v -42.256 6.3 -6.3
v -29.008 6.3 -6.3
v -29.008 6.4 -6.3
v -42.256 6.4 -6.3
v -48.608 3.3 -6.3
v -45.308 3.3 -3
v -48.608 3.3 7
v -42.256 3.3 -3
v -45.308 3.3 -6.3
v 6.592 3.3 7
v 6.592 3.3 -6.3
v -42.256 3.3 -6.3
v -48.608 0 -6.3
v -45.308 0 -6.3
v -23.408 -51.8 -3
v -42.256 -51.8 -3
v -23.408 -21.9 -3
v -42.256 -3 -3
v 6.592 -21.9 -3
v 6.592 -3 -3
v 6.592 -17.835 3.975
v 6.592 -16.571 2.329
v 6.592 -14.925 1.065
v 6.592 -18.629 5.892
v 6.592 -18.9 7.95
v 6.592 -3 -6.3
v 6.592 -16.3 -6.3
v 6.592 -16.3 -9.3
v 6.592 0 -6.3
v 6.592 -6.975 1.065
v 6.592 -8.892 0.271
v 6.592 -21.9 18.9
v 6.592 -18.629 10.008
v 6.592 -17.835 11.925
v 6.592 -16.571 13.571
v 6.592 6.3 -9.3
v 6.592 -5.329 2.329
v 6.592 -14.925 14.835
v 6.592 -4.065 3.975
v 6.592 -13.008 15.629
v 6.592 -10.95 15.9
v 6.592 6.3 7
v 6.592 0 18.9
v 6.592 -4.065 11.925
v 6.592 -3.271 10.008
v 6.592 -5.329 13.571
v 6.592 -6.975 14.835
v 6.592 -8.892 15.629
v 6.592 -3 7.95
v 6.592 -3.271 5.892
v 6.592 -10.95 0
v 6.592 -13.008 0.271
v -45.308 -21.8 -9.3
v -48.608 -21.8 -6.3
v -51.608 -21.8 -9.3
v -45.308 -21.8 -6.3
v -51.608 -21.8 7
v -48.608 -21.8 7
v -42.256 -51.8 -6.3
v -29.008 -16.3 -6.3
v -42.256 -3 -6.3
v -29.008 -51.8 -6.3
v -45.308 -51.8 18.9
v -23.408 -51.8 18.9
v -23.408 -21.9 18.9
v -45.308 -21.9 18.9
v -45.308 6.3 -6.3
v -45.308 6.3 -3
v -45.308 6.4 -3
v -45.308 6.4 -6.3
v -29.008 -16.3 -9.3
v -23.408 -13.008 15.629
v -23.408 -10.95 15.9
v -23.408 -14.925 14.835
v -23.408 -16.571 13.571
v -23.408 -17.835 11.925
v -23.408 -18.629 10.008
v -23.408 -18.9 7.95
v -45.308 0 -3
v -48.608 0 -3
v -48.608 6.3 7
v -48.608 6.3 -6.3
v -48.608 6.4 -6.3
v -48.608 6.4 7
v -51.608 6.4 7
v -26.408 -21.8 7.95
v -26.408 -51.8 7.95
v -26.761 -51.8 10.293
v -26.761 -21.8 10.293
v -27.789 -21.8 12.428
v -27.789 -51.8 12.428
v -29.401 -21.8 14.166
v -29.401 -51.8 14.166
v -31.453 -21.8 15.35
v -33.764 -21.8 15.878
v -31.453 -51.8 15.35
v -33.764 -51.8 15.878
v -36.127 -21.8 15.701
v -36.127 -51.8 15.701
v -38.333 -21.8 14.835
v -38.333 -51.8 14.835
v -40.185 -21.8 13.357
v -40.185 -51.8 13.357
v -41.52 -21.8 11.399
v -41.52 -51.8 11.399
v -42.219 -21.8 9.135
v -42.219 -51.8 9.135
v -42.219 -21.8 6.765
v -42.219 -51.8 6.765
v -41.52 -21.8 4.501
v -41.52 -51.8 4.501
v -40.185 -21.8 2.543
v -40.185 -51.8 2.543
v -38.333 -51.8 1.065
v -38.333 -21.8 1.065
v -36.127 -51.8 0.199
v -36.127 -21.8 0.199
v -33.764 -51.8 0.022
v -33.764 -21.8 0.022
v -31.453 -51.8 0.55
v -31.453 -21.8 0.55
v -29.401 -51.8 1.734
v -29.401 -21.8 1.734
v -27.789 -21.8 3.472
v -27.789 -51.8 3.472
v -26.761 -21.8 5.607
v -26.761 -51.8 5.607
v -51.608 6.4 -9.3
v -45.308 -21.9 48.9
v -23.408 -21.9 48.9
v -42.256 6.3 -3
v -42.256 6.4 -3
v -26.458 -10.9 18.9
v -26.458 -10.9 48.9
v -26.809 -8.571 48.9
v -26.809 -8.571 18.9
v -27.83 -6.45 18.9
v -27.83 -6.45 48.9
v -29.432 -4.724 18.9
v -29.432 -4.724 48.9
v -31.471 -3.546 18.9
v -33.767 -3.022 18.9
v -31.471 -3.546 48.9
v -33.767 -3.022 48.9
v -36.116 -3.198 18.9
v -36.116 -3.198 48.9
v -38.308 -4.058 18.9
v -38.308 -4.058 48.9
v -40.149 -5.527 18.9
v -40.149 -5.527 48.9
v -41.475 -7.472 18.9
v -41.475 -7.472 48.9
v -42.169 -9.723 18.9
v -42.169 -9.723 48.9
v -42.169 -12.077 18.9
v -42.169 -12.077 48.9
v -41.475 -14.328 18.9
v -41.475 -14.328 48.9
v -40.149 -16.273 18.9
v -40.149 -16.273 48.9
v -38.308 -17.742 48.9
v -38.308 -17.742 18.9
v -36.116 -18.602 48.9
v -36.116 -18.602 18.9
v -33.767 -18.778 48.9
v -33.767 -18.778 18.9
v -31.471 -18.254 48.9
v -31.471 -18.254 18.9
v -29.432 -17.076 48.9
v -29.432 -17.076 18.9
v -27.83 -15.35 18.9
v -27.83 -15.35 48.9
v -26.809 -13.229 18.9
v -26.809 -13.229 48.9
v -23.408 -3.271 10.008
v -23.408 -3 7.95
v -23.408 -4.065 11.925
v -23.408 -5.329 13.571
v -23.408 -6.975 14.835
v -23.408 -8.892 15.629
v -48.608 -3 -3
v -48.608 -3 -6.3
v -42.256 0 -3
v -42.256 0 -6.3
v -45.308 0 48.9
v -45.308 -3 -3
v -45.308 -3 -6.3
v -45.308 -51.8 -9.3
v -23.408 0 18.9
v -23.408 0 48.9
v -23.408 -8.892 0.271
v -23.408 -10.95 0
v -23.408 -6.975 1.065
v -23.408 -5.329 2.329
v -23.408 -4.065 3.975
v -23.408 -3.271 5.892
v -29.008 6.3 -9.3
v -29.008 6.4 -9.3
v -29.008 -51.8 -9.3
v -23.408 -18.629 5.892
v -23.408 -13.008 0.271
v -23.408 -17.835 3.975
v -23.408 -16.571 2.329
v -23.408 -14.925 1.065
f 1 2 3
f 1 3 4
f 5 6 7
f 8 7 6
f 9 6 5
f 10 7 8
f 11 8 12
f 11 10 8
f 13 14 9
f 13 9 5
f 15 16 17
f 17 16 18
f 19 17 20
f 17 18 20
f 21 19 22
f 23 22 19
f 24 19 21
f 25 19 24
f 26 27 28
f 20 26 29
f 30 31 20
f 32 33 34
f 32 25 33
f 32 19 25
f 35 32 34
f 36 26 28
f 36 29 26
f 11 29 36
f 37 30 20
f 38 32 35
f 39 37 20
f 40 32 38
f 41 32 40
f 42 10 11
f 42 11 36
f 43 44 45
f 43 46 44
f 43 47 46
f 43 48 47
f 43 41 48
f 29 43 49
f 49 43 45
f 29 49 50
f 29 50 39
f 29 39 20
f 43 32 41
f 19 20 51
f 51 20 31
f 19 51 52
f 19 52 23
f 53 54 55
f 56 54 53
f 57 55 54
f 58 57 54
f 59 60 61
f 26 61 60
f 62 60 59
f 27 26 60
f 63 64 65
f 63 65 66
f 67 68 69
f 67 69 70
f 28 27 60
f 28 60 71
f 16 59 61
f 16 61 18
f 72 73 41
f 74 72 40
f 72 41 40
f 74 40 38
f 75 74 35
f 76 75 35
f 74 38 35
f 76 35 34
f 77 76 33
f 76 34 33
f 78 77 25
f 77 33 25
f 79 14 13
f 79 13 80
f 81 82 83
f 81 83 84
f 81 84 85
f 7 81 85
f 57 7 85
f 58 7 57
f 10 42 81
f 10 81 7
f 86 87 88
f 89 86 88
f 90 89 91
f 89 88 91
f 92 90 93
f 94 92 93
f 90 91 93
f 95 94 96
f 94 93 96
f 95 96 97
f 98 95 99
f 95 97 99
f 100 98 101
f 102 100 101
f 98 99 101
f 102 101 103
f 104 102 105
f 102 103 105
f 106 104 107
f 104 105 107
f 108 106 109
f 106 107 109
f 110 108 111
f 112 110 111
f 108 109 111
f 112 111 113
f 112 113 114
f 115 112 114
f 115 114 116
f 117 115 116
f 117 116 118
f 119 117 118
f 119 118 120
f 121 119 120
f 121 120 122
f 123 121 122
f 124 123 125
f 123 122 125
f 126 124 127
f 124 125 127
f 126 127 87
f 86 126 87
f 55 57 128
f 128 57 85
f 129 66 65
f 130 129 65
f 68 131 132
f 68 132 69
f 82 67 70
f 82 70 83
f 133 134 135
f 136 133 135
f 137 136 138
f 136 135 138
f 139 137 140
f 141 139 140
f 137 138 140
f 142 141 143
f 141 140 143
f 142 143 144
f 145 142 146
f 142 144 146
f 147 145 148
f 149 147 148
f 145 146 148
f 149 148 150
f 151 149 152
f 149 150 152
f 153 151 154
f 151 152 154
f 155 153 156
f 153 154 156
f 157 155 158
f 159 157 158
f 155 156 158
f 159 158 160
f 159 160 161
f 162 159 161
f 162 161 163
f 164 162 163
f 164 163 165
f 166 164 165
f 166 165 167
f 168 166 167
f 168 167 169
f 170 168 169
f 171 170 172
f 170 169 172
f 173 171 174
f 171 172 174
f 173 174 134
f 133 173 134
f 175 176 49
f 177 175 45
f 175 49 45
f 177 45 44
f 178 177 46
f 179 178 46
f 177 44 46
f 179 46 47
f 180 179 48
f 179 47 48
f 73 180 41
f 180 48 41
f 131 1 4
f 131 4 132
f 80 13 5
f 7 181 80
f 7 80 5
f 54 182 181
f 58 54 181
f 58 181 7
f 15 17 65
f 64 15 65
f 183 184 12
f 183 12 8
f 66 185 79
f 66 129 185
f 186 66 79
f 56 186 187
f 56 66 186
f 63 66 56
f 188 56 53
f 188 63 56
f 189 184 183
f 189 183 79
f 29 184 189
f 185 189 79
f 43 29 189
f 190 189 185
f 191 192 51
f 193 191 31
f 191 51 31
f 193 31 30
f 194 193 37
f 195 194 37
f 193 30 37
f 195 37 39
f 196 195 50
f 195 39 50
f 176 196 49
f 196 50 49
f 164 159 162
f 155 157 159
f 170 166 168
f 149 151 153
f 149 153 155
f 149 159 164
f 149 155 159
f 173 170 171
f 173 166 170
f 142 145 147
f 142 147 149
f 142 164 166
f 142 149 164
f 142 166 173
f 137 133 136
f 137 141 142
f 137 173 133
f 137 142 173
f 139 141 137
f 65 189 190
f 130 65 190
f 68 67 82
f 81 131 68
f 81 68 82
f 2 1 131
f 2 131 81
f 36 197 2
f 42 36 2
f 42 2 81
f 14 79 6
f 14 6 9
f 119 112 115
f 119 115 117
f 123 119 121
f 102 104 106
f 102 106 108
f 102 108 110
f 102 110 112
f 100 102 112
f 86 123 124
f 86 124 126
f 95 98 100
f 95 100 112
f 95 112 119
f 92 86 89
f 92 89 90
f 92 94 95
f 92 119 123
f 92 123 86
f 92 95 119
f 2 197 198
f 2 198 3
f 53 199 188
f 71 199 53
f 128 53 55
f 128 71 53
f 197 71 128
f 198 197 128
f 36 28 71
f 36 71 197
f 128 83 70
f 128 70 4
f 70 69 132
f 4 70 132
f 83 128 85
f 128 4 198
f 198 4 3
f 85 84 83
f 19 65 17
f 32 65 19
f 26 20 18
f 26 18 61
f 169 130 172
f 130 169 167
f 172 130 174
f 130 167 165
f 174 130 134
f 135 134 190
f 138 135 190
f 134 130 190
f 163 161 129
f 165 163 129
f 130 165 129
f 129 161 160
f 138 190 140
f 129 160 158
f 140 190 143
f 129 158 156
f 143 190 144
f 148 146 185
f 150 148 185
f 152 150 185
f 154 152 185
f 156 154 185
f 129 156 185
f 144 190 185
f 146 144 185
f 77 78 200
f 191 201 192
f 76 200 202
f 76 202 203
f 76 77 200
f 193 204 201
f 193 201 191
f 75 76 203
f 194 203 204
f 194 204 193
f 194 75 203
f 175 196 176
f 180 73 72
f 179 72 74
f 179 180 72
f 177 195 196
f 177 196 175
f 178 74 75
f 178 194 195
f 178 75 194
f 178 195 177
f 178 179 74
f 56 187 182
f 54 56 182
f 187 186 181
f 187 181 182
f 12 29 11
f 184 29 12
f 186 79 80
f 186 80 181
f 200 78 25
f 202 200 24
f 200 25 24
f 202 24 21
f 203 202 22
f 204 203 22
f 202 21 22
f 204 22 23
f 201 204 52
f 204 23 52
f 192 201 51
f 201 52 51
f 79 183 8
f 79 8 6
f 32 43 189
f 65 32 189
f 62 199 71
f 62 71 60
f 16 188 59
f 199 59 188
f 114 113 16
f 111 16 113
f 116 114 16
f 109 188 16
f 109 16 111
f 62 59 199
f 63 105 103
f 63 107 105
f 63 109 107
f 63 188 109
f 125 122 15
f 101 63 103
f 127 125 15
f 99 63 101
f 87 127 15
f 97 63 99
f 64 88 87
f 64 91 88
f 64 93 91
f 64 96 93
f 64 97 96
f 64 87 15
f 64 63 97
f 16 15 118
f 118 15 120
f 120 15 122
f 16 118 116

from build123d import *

# Parameters (mm, degrees)
F0_W      = 27
F0_H      = 15.9
F0_W_2    = 15.9
F0_H_2    = 27
F0_W_3    = 3
F0_H_3    = 3
F1_DEPTH  = 21.9
F2_DEPTH  = 51.8
F3_R      = 7.95
F6_DEPTH  = 30
F7_DEPTH  = 30
F4_R      = 7.9
F8_DEPTH  = 30
F12_DEPTH = 58.2
F13_DEPTH = 58.2
F14_DEPTH = 30


with BuildPart() as f1:
    # F0 (on Front) → F1 (new body)
    with BuildSketch(Plane.XZ):
        with BuildLine():
            Line((-34.3576915575, 15.9), (-42.3076915575, 15.9))
            Line((-42.3076915575, 15.9), (-42.3076915575, 7.9499999931))
            ThreePointArc((-42.3076915575, 7.9499999931), (-39.9791904704, 13.571498908), (-34.3576915575, 15.9))
        make_face()
        with BuildLine():
            ThreePointArc((-34.3576915575, 15.9), (-39.9791904704, 13.571498908), (-42.3076915575, 7.9499999931))
            ThreePointArc((-42.3076915575, 7.9499999931), (-39.9791904655, 2.3285010871), (-34.3576915575, 0))
            ThreePointArc((-34.3576915575, 0), (-28.7361926471, 2.3285010896), (-26.4076915575, 7.95))
            ThreePointArc((-26.4076915575, 7.95), (-28.7361926471, 13.5714989104), (-34.3576915575, 15.9))
        make_face()
        Polygon((-42.3076915575, 18.9), (-42.3076915575, 45.9), (-26.4076915575, 45.9), (-26.4076915575, 18.9), (-23.4076915575, 18.9), (-23.4076915575, 48.9), (-45.3076915575, 48.9), (-45.3076915575, 18.9), align=None)
        with Locations((-9.9076915575, 7.95)):
            Rectangle(F0_W, F0_H)
        with Locations((-34.3576915575, 32.4)):
            Rectangle(F0_W_2, F0_H_2)
        with BuildLine():
            ThreePointArc((-34.3576915575, 0), (-39.9791904655, 2.3285010871), (-42.3076915575, 7.9499999931))
            Line((-42.3076915575, 7.9499999931), (-42.3076915575, 0))
            Line((-42.3076915575, 0), (-34.3576915575, 0))
        make_face()
        with BuildLine():
            Line((-26.4076915575, 0), (-26.4076915575, 7.95))
            ThreePointArc((-26.4076915575, 7.95), (-28.7361926471, 2.3285010896), (-34.3576915575, 0))
            Line((-34.3576915575, 0), (-26.4076915575, 0))
        make_face()
        with BuildLine():
            Line((-26.4076915575, 7.95), (-26.4076915575, 15.9))
            Line((-26.4076915575, 15.9), (-34.3576915575, 15.9))
            ThreePointArc((-34.3576915575, 15.9), (-28.7361926471, 13.5714989104), (-26.4076915575, 7.95))
        make_face()
        Polygon((6.5923084425, 18.9), (-23.4076915575, 18.9), (-23.4076915575, 15.9), (3.5923084425, 15.9), (3.5923084425, 0), (-23.4076915575, 0), (-23.4076915575, -3), (6.5923084425, -3), align=None)
        Polygon((-26.4076915575, 18.9), (-42.3076915575, 18.9), (-42.3076915575, 15.9), (-34.3576915575, 15.9), (-26.4076915575, 15.9), align=None)
        Polygon((-23.4076915575, 15.9), (-26.4076915575, 15.9), (-26.4076915575, 7.95), (-26.4076915575, 0), (-23.4076915575, 0), align=None)
        Polygon((-42.3076915575, 15.9), (-42.3076915575, 18.9), (-45.3076915575, 18.9), (-45.3076915575, -3), (-23.4076915575, -3), (-23.4076915575, 0), (-26.4076915575, 0), (-34.3576915575, 0), (-42.3076915575, 0), (-42.3076915575, 7.9499999931), align=None)
        with Locations((-24.9076915575, 17.4)):
            Rectangle(F0_W_3, F0_H_3)
    extrude(amount=F1_DEPTH)

    # F0 (on Front) → F2 (join)
    with BuildSketch(Plane.XZ):
        Polygon((-42.3076915575, 15.9), (-42.3076915575, 18.9), (-45.3076915575, 18.9), (-45.3076915575, -3), (-23.4076915575, -3), (-23.4076915575, 0), (-26.4076915575, 0), (-34.3576915575, 0), (-42.3076915575, 0), (-42.3076915575, 7.9499999931), align=None)
        with BuildLine():
            ThreePointArc((-34.3576915575, 15.9), (-39.9791904704, 13.571498908), (-42.3076915575, 7.9499999931))
            ThreePointArc((-42.3076915575, 7.9499999931), (-39.9791904655, 2.3285010871), (-34.3576915575, 0))
            ThreePointArc((-34.3576915575, 0), (-28.7361926471, 2.3285010896), (-26.4076915575, 7.95))
            ThreePointArc((-26.4076915575, 7.95), (-28.7361926471, 13.5714989104), (-34.3576915575, 15.9))
        make_face()
        Polygon((-26.4076915575, 18.9), (-42.3076915575, 18.9), (-42.3076915575, 15.9), (-34.3576915575, 15.9), (-26.4076915575, 15.9), align=None)
        Polygon((-23.4076915575, 15.9), (-26.4076915575, 15.9), (-26.4076915575, 7.95), (-26.4076915575, 0), (-23.4076915575, 0), align=None)
        with Locations((-24.9076915575, 17.4)):
            Rectangle(F0_W_3, F0_H_3)
        with BuildLine():
            Line((-26.4076915575, 7.95), (-26.4076915575, 15.9))
            Line((-26.4076915575, 15.9), (-34.3576915575, 15.9))
            ThreePointArc((-34.3576915575, 15.9), (-28.7361926471, 13.5714989104), (-26.4076915575, 7.95))
        make_face()
        with BuildLine():
            Line((-34.3576915575, 15.9), (-42.3076915575, 15.9))
            Line((-42.3076915575, 15.9), (-42.3076915575, 7.9499999931))
            ThreePointArc((-42.3076915575, 7.9499999931), (-39.9791904704, 13.571498908), (-34.3576915575, 15.9))
        make_face()
        with BuildLine():
            ThreePointArc((-34.3576915575, 0), (-39.9791904655, 2.3285010871), (-42.3076915575, 7.9499999931))
            Line((-42.3076915575, 7.9499999931), (-42.3076915575, 0))
            Line((-42.3076915575, 0), (-34.3576915575, 0))
        make_face()
        with BuildLine():
            Line((-26.4076915575, 0), (-26.4076915575, 7.95))
            ThreePointArc((-26.4076915575, 7.95), (-28.7361926471, 2.3285010896), (-34.3576915575, 0))
            Line((-34.3576915575, 0), (-26.4076915575, 0))
        make_face()
    extrude(amount=F2_DEPTH)

    # F3 (on face) → F6 (cut)
    with BuildSketch(Plane.XZ.offset(51.8)):
        with Locations((-34.3576915575, 7.95)):
            Circle(F3_R)
    extrude(amount=-F6_DEPTH, mode=Mode.SUBTRACT)

    # F5 (on face) → F7 (cut)
    with BuildSketch(Plane.YZ.offset(6.5923084425)):
        with BuildLine():
            ThreePointArc((-3, 7.95), (-5.3285010896, 13.5714989104), (-10.95, 15.9))
            ThreePointArc((-10.95, 15.9), (-16.5714989104, 13.5714989104), (-18.9, 7.95))
            ThreePointArc((-18.9, 7.95), (-16.5714989104, 2.3285010896), (-10.95, 0))
            ThreePointArc((-10.95, 0), (-5.3285010896, 2.3285010896), (-3, 7.95))
        make_face()
    extrude(amount=-F7_DEPTH, mode=Mode.SUBTRACT)

    # F4 (on face) → F8 (cut)
    with BuildSketch(Plane.XY.offset(48.9)):
        with Locations((-34.3576915575, -10.9)):
            Circle(F4_R)
    extrude(amount=-F8_DEPTH, mode=Mode.SUBTRACT)

    # F10 (on face) → F12 (join)
    with BuildSketch(Plane.XZ.offset(51.8)):
        Polygon((-45.3076915575, -9.3), (-45.3076915575, -6.3), (-48.6076915575, -6.3), (-48.6076915575, 7), (-51.6076915575, 7), (-51.6076915575, -9.3), align=None)
        Polygon((-42.255833745, -3), (-45.3076915575, -3), (-45.3076915575, -6.3), (-45.3076915575, -9.3), (-29.0076915575, -9.3), (-29.0076915575, -6.3), (-42.255833745, -6.3), align=None)
    extrude(amount=-F12_DEPTH)

    # F11 (on face) → F13 (join, through all)
    with BuildSketch(Plane.YZ.offset(6.5923084425)):
        Polygon((0, -6.3), (0, -3), (-3, -3), (-3, -6.3), (-16.3, -6.3), (-16.3, -9.3), (0, -9.3), align=None)
        Polygon((3.3, -6.3), (0, -6.3), (0, -9.3), (6.3, -9.3), (6.3, 7), (3.3, 7), align=None)
    extrude(amount=-F13_DEPTH)

    # F10 (on face) → F14 (cut)
    with BuildSketch(Plane.XZ.offset(51.8)):
        Polygon((-45.3076915575, -9.3), (-45.3076915575, -6.3), (-48.6076915575, -6.3), (-48.6076915575, 7), (-51.6076915575, 7), (-51.6076915575, -9.3), align=None)
    extrude(amount=-F14_DEPTH, mode=Mode.SUBTRACT)


solid = f1.part
